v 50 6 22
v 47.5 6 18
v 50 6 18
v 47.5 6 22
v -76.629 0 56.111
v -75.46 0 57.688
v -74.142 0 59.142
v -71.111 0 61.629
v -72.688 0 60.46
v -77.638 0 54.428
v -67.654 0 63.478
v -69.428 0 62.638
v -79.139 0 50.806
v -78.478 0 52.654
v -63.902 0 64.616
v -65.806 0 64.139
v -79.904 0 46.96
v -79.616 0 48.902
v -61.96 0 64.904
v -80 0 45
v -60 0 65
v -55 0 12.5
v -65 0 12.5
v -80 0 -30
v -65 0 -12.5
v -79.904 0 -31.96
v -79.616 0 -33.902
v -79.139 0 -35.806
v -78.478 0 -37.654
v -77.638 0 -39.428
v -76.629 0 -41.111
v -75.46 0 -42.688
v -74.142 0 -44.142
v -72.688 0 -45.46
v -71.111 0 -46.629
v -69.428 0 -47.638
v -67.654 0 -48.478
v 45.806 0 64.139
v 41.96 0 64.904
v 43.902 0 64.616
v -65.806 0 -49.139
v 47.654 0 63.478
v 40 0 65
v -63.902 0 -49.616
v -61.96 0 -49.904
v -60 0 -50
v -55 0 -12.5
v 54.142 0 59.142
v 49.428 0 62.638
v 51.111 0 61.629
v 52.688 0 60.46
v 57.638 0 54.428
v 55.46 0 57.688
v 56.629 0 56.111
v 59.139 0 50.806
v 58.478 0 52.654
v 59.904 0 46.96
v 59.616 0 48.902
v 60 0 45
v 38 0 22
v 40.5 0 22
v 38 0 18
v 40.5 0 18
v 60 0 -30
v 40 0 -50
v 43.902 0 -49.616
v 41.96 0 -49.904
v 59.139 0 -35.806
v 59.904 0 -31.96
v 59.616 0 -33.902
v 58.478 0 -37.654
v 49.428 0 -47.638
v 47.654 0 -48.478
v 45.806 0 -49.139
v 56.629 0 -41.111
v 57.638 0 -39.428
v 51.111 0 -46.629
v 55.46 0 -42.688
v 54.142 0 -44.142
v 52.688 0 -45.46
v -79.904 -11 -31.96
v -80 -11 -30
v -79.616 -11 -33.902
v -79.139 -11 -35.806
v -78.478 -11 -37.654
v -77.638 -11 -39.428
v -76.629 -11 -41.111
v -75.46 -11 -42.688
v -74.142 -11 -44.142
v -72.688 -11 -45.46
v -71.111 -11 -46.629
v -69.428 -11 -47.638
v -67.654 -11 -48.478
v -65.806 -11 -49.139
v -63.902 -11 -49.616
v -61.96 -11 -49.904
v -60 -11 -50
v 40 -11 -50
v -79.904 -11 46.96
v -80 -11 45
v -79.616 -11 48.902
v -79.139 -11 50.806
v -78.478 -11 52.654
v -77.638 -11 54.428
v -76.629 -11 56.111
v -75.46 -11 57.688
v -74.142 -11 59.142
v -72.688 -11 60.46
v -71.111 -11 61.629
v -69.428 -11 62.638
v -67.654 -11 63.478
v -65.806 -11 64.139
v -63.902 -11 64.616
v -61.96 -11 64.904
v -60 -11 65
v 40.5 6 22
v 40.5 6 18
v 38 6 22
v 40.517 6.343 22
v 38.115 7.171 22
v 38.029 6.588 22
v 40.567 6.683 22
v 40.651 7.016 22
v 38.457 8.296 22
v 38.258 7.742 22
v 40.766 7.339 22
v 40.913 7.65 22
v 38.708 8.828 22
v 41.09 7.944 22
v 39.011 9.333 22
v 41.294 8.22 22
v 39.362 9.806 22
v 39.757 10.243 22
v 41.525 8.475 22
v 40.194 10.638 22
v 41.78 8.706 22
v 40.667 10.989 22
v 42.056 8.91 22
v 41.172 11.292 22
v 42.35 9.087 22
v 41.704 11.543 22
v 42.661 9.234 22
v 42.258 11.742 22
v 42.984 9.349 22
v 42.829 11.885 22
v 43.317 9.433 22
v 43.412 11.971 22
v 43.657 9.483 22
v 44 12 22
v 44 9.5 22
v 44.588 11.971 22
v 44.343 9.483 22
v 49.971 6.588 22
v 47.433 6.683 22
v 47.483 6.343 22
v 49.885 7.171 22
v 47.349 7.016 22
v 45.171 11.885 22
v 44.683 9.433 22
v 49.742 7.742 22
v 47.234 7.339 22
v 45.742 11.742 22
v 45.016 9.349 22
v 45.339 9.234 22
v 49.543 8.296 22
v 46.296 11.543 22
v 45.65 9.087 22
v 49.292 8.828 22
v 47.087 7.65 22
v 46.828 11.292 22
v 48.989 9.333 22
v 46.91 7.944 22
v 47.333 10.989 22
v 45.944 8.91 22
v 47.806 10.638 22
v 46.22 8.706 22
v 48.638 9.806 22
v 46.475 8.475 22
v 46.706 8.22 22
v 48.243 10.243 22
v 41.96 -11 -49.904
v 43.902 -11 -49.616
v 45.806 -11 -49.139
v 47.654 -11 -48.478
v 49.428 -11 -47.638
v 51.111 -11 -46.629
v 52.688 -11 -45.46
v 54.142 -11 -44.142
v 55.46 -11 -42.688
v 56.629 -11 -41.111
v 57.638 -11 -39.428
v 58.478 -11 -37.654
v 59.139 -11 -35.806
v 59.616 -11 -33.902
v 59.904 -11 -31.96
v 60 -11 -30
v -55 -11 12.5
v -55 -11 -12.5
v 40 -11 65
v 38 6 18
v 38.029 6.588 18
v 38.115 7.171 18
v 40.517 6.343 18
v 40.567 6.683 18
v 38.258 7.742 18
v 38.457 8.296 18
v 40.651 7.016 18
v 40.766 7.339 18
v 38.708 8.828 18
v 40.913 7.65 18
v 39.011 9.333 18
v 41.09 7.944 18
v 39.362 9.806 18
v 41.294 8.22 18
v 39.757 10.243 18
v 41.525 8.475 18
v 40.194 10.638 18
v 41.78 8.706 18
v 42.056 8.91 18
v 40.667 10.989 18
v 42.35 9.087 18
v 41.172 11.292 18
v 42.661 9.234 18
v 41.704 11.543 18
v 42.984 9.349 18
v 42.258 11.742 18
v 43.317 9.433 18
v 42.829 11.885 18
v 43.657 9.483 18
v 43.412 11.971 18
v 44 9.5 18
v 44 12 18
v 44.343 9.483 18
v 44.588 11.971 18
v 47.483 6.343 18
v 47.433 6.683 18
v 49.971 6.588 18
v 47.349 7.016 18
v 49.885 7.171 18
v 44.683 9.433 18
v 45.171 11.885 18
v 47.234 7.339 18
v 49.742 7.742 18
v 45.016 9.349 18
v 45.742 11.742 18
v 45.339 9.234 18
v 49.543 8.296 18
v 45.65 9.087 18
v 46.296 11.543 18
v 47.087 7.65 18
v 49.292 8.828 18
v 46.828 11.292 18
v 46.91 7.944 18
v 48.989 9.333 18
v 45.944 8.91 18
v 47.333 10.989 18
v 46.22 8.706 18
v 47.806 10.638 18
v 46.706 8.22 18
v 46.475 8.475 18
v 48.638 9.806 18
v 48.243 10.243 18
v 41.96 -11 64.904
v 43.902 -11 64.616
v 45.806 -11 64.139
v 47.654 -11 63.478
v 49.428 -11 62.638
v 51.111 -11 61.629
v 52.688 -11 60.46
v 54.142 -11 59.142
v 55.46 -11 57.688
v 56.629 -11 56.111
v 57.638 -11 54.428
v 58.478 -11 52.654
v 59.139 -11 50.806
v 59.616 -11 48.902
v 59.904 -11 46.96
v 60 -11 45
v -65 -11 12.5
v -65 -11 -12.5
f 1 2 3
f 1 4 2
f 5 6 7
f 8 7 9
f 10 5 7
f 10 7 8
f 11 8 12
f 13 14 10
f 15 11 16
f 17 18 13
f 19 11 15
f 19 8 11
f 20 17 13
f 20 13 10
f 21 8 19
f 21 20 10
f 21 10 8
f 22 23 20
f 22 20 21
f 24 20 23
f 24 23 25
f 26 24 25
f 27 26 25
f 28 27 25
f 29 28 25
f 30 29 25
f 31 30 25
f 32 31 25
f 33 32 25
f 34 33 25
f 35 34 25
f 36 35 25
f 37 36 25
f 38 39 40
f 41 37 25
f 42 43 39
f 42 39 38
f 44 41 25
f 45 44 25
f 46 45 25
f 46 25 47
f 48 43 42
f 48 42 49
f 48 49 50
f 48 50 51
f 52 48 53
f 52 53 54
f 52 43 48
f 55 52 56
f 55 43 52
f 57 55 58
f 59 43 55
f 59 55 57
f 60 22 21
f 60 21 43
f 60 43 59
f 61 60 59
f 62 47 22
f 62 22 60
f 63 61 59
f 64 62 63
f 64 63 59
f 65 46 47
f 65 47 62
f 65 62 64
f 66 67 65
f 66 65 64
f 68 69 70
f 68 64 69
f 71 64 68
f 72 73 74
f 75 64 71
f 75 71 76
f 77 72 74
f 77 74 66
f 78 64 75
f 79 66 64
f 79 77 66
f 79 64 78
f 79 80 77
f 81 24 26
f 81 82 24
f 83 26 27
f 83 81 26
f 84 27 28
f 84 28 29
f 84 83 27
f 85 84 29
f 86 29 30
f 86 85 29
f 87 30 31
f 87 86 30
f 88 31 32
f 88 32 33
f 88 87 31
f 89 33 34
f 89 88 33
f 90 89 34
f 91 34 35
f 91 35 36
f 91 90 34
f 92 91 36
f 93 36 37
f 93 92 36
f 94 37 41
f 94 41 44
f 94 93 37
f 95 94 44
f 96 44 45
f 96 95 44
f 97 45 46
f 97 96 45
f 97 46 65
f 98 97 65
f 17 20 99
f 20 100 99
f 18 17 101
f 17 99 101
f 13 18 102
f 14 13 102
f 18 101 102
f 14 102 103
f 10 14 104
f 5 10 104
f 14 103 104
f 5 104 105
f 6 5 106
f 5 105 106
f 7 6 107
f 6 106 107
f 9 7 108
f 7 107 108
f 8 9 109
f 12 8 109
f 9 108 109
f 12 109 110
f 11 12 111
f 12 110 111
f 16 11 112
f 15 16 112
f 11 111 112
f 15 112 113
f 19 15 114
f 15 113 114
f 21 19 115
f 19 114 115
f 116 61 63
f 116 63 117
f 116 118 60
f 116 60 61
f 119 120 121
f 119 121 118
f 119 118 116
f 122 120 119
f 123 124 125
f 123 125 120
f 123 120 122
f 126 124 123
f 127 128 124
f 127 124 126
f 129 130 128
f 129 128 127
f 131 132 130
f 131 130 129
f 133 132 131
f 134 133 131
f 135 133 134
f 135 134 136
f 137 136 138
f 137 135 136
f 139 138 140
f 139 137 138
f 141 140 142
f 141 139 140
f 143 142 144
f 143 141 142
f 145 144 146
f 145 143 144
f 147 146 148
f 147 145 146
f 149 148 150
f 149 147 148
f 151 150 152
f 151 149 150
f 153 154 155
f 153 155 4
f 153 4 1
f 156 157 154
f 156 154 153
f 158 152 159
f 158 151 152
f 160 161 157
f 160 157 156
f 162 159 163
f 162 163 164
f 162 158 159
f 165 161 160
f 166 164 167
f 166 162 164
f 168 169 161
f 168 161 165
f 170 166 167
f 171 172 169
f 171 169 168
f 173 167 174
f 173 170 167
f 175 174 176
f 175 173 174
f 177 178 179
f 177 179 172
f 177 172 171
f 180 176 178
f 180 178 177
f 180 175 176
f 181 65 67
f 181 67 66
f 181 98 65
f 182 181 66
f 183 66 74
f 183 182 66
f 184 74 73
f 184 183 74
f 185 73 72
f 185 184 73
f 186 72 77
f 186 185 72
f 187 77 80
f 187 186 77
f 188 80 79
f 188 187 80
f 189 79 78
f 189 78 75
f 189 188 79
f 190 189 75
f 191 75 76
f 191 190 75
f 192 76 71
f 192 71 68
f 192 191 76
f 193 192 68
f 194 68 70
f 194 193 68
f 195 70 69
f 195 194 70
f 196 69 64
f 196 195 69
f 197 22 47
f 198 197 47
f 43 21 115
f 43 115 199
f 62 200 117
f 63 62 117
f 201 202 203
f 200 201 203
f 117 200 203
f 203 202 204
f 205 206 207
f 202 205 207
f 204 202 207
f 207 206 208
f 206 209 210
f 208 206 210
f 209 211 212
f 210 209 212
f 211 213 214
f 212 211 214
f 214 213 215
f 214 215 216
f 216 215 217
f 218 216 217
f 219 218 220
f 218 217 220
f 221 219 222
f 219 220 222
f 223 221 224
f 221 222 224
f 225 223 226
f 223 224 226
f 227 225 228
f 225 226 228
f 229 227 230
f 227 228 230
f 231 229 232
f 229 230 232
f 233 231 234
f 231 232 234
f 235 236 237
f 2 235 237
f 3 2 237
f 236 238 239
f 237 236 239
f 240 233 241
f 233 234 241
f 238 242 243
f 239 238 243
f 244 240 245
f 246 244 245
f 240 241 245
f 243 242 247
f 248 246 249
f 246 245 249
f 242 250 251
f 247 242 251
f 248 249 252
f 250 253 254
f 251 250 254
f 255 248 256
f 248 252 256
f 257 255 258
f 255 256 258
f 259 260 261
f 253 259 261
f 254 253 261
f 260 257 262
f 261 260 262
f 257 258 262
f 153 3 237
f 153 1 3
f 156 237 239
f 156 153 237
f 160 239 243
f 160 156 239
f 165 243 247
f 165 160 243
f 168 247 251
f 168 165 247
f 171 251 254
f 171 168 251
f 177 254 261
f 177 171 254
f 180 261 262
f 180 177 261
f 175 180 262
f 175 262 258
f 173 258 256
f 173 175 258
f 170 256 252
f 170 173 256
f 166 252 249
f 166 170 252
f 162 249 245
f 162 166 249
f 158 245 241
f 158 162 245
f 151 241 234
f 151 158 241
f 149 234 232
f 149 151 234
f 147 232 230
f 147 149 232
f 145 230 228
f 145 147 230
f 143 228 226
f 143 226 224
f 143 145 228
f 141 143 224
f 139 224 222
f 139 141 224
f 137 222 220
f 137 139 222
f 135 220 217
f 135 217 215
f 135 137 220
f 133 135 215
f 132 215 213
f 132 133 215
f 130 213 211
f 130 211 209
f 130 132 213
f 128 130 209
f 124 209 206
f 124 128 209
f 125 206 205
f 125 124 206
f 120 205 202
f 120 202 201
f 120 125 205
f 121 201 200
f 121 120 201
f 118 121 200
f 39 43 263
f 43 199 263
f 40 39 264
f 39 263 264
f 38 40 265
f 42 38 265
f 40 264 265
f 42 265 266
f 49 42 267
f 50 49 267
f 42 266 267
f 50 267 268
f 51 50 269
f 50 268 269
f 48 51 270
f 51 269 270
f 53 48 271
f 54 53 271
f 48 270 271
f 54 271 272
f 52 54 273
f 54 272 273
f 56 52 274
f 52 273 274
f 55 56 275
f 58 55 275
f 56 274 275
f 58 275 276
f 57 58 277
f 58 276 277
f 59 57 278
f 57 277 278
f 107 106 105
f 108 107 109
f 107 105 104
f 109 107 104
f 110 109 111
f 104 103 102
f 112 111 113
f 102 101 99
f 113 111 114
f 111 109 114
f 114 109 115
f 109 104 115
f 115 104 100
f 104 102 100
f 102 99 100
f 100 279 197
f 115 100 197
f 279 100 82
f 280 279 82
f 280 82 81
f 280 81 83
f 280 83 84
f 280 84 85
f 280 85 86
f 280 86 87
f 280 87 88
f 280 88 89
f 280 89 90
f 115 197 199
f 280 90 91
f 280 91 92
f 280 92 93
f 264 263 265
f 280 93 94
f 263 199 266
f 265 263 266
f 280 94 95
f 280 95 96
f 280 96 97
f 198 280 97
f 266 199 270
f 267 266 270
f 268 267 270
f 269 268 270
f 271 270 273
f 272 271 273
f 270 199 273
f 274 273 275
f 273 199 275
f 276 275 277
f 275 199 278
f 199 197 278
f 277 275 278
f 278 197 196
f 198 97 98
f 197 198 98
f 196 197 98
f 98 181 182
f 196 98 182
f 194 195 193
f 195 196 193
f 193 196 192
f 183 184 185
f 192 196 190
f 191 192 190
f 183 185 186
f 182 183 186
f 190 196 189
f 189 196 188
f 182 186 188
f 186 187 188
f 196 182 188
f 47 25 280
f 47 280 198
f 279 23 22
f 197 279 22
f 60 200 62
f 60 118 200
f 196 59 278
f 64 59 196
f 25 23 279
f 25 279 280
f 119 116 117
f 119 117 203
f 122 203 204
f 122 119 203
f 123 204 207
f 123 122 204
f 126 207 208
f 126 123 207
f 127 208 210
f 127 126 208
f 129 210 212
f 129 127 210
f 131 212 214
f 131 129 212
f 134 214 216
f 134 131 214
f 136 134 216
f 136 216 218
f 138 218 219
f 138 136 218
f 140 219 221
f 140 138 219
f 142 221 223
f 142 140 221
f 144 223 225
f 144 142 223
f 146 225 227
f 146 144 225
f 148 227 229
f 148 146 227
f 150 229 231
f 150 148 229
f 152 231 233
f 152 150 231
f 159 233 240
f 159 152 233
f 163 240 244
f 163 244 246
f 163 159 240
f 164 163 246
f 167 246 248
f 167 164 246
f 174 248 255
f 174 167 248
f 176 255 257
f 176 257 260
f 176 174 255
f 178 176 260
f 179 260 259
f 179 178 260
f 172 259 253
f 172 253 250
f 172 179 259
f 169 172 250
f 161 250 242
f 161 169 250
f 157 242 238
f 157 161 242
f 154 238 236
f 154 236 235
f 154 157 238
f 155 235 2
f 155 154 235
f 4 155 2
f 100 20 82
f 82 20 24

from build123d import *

# Parameters (mm, degrees)
SKETCH2_W           = 140
SKETCH2_H           = 115
BOSS_EXTRUDE1_DEPTH = 11
SKETCH3_W           = 10
SKETCH3_H           = 25
CUT_EXTRUDE1_DEPTH  = 104.662915259
FILLET1_R           = 20
BOSS_EXTRUDE2_DEPTH = 2


with BuildPart() as part:
    # Sketch2 → Boss-Extrude1 (new body)
    with BuildSketch(Plane(origin=(0, 0, 0), x_dir=(1, 0, 0), z_dir=(0, 1, 0))):
        with Locations((-10, -7.5)):
            Rectangle(SKETCH2_W, SKETCH2_H)
    extrude(amount=-BOSS_EXTRUDE1_DEPTH)

    # Sketch3 → Cut-Extrude1 (cut, through all)
    with BuildSketch(Plane(origin=(0, 0, 0), x_dir=(1, 0, 0), z_dir=(0, 1, 0))):
        with Locations((-60, 0)):
            Rectangle(SKETCH3_W, SKETCH3_H)
    extrude(amount=-CUT_EXTRUDE1_DEPTH, mode=Mode.SUBTRACT)

    # Fillet1
    fillet1_edges = [part.edges().sort_by_distance(p)[0] for p in [
        (-80, -5.5, -50),
        (60, -5.5, -50),
        (60, -5.5, 65),
        (-80, -5.5, 65),
    ]]
    fillet(fillet1_edges, radius=FILLET1_R)

    # Sketch4 → Boss-Extrude2 (add, symmetric)
    with BuildSketch(Plane.XY.offset(20)):
        with BuildLine():
            Line((38, 6), (38, 0))
            Line((38, 0), (40.5, 0))
            Line((40.5, 0), (40.5, 6))
            ThreePointArc((40.5, 6), (44, 9.5), (47.5, 6))
            Line((47.5, 6), (50, 6))
            ThreePointArc((50, 6), (44, 12), (38, 6))
        make_face()
    extrude(amount=BOSS_EXTRUDE2_DEPTH, both=True)


solid = part.part
